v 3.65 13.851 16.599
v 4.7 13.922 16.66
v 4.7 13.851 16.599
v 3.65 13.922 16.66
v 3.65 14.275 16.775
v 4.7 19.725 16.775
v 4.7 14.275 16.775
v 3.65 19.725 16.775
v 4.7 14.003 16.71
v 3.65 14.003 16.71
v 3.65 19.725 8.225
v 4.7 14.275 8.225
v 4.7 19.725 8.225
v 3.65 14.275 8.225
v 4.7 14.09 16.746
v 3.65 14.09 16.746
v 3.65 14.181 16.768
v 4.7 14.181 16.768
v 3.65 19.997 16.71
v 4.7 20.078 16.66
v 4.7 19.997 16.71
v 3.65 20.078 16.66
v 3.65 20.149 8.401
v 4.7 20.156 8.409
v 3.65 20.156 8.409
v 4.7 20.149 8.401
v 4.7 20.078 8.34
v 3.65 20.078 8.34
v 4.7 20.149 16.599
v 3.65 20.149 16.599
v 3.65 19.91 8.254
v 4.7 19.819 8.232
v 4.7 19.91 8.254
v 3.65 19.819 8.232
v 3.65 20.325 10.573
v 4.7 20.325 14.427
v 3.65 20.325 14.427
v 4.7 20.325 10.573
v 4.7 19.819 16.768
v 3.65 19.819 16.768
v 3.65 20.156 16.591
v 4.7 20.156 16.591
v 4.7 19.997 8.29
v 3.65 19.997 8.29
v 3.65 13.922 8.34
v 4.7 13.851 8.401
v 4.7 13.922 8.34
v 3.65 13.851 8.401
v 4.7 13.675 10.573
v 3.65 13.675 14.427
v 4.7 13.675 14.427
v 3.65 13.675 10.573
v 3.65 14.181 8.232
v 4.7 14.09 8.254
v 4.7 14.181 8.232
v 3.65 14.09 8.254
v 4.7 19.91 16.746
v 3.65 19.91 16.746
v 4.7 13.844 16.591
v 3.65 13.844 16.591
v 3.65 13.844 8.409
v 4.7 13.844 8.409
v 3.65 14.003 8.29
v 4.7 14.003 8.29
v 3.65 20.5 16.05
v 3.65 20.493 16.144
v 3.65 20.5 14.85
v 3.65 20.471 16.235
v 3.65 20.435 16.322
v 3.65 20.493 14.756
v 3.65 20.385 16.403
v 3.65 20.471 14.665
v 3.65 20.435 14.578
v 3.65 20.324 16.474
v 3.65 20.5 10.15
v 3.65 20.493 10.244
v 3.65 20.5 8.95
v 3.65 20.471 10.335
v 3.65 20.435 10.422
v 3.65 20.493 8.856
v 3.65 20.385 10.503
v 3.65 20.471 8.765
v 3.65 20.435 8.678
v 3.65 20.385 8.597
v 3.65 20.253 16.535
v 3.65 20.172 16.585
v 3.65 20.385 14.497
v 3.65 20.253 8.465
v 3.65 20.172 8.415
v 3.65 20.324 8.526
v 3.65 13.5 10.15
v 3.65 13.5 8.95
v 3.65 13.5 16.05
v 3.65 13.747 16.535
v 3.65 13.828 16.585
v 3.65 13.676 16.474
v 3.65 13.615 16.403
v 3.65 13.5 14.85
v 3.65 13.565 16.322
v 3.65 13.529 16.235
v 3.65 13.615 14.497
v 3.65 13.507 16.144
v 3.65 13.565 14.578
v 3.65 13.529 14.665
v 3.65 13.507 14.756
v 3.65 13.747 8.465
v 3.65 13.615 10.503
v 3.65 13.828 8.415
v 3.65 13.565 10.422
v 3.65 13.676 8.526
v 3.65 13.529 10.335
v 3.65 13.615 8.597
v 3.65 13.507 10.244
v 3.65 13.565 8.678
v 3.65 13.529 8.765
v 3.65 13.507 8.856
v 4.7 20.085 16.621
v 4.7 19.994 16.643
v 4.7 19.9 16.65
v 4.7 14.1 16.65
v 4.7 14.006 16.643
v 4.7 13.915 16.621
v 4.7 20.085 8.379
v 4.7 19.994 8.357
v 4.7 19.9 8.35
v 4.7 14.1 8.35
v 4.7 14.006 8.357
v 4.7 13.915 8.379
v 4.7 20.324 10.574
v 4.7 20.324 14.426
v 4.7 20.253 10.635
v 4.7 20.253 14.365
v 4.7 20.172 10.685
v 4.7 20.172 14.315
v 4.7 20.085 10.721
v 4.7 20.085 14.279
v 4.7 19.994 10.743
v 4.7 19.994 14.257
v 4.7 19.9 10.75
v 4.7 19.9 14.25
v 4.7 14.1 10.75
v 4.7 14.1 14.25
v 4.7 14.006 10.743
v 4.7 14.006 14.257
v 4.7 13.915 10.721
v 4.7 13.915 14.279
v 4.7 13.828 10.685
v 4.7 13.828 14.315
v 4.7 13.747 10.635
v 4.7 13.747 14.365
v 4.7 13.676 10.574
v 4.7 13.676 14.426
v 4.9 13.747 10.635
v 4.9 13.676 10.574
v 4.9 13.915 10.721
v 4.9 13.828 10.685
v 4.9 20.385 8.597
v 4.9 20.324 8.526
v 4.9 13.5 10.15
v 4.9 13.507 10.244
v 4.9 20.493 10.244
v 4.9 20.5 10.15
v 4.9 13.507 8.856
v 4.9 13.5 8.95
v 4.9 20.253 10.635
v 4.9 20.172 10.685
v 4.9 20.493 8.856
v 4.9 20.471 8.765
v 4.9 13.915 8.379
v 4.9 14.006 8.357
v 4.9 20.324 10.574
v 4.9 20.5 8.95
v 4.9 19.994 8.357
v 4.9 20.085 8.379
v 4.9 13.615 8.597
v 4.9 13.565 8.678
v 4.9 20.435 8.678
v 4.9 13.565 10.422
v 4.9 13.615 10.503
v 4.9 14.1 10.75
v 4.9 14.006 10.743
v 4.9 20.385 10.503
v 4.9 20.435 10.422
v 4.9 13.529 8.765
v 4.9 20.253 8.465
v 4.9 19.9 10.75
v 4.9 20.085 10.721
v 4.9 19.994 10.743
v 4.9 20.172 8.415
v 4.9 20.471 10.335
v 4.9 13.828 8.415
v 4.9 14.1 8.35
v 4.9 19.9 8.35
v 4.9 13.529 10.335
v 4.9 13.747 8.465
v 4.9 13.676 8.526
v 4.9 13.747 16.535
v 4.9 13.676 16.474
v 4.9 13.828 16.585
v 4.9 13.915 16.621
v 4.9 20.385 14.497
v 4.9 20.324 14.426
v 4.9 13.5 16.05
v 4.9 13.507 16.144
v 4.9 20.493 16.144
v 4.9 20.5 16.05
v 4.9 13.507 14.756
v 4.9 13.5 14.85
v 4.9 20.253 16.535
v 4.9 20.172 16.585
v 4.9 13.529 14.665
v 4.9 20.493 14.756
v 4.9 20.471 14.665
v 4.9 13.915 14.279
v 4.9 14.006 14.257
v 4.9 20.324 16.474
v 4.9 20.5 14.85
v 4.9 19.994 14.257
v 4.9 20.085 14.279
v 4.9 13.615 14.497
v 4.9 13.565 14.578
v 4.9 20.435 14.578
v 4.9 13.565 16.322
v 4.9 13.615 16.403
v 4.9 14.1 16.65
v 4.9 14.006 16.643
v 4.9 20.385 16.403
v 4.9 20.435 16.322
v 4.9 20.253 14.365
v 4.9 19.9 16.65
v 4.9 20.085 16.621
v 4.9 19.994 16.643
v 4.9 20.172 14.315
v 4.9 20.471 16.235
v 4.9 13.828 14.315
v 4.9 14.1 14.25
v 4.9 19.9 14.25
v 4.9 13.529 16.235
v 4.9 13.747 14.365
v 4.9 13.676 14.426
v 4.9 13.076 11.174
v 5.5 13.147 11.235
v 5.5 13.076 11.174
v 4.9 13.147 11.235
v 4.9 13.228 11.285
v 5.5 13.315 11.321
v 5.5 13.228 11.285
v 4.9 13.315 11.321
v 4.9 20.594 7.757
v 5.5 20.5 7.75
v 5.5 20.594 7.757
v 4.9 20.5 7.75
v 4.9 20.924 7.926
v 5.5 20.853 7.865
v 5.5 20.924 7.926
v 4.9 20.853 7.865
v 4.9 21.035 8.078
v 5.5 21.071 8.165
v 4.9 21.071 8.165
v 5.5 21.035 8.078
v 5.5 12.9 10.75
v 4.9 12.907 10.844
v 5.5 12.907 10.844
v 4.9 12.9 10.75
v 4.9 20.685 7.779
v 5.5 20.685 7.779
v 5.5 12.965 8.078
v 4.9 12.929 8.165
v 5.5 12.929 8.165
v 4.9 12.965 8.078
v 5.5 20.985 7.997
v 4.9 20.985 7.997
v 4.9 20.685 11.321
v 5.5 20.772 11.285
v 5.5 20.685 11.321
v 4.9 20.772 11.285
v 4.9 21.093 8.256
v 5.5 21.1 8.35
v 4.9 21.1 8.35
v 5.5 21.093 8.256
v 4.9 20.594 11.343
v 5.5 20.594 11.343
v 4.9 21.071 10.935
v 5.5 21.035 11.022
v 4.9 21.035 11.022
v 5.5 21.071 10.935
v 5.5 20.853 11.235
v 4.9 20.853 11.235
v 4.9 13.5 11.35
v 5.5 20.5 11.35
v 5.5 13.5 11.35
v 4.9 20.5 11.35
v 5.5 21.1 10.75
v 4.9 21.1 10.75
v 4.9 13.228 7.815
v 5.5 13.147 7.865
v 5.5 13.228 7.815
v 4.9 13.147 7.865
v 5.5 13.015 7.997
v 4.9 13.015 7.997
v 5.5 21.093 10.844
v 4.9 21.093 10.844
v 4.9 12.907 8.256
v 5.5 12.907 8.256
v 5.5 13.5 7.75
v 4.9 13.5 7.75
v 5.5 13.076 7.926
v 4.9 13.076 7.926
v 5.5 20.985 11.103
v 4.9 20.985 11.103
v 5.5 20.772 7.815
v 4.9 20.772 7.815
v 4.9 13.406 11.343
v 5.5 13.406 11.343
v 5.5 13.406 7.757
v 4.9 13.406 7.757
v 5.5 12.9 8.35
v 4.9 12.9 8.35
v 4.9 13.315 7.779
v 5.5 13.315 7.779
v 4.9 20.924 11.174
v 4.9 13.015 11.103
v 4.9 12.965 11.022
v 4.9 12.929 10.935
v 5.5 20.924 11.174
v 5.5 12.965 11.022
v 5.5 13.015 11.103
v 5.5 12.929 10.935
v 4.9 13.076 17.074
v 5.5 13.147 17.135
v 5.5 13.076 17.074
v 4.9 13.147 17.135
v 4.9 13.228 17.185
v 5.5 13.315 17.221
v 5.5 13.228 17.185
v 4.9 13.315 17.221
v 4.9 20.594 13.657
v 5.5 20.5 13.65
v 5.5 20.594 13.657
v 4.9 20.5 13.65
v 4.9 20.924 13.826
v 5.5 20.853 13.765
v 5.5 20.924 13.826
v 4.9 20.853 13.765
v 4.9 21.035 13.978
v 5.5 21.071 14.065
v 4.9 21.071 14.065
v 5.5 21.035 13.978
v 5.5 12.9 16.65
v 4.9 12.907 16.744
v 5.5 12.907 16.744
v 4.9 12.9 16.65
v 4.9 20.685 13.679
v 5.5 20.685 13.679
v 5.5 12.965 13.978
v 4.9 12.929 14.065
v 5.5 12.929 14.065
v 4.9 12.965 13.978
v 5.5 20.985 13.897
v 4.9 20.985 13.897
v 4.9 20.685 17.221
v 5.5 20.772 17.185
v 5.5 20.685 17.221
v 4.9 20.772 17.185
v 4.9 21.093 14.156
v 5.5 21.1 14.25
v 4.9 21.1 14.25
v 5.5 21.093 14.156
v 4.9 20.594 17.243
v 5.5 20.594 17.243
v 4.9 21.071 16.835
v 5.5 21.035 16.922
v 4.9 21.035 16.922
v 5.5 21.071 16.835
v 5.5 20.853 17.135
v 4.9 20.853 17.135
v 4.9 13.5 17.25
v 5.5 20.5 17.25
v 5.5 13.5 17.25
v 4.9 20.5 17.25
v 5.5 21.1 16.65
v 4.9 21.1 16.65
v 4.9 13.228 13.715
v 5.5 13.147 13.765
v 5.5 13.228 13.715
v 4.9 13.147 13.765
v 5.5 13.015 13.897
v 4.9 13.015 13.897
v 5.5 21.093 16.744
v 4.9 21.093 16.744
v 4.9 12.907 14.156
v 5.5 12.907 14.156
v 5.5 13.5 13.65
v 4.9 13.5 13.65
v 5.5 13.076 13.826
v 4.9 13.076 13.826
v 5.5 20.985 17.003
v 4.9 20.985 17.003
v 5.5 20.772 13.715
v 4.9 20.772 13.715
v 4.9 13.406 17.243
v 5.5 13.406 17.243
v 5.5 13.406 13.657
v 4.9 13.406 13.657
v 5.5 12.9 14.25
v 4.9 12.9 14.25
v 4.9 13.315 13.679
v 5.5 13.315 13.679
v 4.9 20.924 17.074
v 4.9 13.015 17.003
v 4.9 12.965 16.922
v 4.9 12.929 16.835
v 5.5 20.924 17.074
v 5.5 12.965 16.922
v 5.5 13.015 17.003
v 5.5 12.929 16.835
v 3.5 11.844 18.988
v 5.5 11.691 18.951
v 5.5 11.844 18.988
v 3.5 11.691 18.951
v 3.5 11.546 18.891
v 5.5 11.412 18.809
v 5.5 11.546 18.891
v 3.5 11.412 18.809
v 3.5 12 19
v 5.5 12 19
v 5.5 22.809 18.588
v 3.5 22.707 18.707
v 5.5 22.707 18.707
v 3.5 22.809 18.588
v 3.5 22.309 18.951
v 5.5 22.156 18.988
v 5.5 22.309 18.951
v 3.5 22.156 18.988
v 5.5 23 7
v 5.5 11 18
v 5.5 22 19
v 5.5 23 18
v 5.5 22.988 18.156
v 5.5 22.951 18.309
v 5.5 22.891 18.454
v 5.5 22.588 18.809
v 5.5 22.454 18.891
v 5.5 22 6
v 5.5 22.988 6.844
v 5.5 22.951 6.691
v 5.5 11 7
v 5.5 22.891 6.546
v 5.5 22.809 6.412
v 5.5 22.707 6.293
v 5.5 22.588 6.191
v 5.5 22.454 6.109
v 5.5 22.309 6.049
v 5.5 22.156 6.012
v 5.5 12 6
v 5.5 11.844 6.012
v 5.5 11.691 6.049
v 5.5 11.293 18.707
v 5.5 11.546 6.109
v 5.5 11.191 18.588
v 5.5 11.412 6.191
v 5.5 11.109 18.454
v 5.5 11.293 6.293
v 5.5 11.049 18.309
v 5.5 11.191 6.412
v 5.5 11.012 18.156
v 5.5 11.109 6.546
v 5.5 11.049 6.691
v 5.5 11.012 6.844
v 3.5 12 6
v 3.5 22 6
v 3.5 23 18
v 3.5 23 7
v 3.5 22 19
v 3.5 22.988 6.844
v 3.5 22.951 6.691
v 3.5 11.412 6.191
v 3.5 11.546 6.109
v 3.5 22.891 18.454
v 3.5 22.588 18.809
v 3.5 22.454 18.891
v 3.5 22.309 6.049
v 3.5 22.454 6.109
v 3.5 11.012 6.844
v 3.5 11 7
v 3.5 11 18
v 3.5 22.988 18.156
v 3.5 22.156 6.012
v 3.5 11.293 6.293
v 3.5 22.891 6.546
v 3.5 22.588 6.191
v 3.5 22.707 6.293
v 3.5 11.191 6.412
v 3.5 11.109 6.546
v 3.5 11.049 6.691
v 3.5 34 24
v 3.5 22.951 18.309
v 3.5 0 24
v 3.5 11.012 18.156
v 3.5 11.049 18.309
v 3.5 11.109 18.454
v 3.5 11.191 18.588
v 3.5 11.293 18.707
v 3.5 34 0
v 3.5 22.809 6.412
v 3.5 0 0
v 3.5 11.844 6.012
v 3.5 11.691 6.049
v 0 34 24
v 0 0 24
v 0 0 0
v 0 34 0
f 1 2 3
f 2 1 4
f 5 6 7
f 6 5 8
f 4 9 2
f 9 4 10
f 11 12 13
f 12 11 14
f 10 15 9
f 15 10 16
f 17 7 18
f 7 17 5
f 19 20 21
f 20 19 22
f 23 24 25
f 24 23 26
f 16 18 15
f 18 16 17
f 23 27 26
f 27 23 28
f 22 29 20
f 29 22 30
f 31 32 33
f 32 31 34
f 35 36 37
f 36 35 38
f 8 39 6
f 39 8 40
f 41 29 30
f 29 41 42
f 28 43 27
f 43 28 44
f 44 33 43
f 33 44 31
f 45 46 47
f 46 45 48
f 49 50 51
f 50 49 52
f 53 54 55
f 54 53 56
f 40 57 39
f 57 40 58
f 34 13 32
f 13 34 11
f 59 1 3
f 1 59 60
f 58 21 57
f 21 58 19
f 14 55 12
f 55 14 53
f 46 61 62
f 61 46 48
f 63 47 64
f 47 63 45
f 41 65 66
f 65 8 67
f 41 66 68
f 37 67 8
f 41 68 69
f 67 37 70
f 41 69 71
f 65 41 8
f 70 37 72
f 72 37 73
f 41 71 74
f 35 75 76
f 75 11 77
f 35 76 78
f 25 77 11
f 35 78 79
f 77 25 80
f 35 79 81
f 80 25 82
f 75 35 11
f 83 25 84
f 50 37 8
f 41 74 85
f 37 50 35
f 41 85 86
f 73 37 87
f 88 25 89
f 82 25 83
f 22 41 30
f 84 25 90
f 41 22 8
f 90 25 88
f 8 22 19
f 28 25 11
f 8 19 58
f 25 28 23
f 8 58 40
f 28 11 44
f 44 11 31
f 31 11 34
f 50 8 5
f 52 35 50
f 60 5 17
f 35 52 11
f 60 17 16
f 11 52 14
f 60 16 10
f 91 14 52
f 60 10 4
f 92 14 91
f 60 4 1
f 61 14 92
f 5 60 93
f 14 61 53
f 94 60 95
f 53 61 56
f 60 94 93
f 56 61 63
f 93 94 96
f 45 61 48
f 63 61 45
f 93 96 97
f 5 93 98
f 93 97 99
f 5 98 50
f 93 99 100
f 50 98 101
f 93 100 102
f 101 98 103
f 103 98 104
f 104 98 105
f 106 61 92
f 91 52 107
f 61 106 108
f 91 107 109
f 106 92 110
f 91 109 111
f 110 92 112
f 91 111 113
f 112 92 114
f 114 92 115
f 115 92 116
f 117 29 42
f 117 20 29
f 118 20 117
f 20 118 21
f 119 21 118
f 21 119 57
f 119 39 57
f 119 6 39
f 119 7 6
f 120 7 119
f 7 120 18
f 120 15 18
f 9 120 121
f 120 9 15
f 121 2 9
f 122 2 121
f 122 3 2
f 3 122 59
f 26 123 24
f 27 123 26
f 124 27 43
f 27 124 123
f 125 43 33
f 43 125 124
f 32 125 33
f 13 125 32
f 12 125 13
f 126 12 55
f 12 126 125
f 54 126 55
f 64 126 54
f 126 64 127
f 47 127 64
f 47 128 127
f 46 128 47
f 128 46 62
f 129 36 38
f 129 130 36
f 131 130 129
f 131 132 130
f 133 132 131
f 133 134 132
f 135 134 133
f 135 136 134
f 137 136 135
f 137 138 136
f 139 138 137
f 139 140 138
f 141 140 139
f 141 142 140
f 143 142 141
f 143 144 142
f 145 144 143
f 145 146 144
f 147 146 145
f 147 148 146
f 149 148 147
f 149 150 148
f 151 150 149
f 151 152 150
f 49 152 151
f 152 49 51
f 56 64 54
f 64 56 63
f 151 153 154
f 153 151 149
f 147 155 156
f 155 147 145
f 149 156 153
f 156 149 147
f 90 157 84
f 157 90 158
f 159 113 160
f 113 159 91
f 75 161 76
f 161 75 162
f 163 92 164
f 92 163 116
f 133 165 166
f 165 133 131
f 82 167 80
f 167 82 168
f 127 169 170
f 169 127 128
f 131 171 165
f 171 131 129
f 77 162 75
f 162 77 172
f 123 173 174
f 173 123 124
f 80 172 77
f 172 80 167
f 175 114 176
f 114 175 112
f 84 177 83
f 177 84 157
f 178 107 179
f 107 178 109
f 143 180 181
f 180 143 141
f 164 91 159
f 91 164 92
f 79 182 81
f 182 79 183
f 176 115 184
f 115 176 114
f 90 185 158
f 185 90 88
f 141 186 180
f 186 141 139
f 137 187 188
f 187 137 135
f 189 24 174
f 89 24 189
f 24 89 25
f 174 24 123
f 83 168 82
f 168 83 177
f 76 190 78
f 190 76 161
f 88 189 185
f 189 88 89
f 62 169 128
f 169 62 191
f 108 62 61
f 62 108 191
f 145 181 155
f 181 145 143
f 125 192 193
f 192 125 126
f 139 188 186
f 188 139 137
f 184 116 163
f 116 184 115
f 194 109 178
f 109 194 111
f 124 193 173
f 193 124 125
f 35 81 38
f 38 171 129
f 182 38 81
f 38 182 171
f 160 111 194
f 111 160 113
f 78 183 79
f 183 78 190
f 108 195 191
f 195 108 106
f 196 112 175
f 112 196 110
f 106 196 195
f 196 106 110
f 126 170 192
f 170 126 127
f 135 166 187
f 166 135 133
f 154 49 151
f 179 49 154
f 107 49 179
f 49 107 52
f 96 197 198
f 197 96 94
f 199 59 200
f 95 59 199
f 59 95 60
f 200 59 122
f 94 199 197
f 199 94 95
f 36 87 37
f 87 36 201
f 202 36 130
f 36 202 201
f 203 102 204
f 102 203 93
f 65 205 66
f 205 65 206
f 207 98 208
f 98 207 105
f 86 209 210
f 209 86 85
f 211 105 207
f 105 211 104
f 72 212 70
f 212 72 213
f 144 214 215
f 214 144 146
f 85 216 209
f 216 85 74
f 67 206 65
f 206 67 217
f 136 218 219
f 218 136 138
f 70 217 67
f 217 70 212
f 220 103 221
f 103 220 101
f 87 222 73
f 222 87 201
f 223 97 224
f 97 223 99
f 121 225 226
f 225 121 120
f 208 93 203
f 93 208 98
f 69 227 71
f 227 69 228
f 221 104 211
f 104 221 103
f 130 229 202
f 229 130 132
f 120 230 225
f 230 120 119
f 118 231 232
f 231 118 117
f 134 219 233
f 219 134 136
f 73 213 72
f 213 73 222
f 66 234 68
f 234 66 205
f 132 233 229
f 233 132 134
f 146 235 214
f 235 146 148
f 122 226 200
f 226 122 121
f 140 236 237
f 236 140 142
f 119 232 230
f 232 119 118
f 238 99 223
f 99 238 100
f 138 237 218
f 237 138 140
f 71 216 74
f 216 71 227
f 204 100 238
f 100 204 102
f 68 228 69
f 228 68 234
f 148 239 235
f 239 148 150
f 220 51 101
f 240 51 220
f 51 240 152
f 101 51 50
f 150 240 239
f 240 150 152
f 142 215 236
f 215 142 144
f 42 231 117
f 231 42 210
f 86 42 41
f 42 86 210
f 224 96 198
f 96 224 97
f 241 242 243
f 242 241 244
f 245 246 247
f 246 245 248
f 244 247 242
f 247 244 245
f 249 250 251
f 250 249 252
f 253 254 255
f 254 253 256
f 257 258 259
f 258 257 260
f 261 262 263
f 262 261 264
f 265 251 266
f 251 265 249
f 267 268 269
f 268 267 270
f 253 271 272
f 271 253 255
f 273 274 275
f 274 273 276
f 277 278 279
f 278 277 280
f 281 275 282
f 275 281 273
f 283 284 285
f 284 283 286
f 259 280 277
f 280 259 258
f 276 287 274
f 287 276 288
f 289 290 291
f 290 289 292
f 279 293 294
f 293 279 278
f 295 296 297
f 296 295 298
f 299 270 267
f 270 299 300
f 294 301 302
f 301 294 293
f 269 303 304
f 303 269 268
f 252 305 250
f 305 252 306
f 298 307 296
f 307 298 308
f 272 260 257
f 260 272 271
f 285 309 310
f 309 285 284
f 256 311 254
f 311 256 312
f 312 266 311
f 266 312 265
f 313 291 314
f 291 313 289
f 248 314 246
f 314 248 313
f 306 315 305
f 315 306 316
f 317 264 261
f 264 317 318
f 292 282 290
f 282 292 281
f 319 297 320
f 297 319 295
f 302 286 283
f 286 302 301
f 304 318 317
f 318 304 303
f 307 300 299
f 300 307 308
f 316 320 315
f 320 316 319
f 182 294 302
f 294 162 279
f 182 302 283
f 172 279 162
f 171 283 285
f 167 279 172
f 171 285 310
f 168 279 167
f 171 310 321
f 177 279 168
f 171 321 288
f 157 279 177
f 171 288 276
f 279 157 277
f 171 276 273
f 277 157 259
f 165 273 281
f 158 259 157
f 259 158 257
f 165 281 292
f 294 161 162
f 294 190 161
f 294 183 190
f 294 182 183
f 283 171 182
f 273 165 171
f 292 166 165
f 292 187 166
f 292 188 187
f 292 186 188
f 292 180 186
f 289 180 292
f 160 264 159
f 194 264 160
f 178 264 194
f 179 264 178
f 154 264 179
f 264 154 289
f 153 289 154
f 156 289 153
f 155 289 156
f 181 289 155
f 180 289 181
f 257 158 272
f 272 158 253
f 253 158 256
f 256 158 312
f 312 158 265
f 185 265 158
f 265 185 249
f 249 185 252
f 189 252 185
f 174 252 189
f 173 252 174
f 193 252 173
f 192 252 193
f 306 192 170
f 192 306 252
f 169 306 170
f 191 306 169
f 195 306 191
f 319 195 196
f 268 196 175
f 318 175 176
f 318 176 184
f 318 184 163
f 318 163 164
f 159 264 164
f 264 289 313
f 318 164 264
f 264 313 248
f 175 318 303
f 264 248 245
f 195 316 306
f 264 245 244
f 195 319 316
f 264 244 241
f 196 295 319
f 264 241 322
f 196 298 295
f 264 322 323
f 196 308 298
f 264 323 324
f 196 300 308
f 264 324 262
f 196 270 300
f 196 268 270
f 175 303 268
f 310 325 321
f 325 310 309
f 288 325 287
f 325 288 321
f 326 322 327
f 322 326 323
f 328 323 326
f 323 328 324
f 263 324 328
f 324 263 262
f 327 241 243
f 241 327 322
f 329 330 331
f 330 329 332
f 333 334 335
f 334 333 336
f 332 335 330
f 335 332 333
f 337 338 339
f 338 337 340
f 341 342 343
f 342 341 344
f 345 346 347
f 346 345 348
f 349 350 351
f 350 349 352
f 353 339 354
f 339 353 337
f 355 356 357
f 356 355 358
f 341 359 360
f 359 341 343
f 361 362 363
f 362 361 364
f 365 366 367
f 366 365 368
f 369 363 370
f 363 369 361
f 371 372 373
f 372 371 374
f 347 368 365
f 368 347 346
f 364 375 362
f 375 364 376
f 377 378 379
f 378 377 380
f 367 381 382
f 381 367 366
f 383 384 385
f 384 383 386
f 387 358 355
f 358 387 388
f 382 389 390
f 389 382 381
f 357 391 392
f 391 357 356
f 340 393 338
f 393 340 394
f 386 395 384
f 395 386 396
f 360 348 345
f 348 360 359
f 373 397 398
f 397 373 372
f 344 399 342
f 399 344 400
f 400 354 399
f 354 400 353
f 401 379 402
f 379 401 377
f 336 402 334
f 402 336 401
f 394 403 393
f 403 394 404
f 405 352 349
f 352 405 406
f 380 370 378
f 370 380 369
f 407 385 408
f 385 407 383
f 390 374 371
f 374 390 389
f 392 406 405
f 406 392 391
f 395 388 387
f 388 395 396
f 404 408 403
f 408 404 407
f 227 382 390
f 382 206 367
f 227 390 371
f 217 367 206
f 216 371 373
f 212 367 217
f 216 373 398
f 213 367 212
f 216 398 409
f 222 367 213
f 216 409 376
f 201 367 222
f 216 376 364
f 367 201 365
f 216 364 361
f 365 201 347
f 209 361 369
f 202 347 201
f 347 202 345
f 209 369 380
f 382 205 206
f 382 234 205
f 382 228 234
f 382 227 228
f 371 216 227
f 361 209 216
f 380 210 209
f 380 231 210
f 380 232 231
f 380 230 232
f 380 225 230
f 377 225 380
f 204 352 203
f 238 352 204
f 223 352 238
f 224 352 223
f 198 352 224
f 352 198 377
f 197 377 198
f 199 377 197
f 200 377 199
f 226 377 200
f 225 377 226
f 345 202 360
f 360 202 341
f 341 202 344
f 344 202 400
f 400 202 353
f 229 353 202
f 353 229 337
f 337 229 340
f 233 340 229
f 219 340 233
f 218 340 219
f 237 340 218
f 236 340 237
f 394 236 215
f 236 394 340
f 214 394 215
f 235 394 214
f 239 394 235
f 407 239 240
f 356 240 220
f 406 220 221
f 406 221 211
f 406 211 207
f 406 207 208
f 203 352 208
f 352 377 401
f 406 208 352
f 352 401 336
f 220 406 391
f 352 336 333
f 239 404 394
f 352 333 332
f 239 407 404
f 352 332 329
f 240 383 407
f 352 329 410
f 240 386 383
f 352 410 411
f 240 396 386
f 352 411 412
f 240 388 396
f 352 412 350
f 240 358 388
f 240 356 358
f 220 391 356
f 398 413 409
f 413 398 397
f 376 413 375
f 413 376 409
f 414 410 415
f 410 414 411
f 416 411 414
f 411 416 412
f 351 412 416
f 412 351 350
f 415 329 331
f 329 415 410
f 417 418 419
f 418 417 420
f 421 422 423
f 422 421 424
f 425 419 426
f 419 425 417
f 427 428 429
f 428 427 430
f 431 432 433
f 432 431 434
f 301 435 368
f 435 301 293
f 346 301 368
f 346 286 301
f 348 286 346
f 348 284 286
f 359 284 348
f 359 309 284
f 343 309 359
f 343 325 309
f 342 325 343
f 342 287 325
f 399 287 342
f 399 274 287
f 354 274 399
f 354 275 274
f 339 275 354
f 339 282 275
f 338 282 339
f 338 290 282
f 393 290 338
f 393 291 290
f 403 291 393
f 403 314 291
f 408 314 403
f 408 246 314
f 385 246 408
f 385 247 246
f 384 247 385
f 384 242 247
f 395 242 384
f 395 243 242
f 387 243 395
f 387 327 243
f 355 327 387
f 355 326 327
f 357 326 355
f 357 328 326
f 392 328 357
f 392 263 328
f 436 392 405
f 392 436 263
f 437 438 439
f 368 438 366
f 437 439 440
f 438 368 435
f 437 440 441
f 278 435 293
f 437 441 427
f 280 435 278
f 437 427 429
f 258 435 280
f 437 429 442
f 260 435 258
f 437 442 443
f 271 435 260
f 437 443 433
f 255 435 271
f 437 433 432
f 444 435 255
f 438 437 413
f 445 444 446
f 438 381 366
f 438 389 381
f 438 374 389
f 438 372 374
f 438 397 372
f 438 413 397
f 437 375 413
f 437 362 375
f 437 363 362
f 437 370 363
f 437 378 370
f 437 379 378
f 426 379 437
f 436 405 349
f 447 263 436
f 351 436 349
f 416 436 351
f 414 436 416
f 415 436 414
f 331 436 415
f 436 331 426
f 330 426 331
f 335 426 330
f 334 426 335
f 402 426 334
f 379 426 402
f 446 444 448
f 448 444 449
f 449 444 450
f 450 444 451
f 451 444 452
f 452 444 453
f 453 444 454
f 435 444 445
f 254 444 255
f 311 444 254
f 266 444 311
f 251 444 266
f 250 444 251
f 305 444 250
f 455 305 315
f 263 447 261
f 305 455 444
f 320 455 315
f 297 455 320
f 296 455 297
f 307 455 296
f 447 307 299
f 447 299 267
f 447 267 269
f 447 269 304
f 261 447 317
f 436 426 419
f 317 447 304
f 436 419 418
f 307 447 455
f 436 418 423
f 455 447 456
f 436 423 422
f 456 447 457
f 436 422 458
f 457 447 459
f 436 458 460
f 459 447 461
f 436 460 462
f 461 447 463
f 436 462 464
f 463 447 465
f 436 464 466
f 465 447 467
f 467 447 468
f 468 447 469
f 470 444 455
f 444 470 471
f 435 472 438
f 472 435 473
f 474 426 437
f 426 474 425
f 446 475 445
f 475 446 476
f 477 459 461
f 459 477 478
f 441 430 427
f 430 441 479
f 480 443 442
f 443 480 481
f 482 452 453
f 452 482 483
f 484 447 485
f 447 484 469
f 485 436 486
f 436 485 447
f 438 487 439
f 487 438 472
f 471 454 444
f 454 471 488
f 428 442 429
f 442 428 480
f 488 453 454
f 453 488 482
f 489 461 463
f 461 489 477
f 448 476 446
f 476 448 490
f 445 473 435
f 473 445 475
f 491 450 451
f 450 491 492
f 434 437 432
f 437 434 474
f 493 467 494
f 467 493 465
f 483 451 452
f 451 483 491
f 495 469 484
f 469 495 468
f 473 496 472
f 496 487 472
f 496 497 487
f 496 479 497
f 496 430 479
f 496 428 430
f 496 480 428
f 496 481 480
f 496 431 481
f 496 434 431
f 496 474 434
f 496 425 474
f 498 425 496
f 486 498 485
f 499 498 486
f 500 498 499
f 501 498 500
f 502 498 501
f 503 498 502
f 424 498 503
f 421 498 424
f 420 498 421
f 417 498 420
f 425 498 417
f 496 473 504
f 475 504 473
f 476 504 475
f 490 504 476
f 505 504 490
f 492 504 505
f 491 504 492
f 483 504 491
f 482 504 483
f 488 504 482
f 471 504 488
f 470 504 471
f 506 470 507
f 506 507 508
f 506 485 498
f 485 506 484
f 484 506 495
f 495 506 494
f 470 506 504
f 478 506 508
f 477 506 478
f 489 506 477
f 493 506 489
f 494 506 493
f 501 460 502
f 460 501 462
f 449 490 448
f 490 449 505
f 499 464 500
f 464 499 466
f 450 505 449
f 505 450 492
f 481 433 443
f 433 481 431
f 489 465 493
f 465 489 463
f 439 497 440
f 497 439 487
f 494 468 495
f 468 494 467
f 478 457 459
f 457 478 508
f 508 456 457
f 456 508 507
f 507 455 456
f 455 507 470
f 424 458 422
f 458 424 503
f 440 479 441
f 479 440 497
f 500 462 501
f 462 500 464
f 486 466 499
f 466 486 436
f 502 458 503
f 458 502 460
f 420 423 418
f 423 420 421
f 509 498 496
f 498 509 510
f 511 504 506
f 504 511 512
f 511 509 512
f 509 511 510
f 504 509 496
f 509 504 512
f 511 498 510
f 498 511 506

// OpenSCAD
// Wall-integrated recessed zip-tie bridge pattern.
// The exterior wall remains solid. Slot cuts are limited to the inward pad.

$fn = 40;
eps = 0.02;

wall_thickness = 3.5;
wall_length = 34;
wall_height = 24;

pad_width = 12;
pad_height = 13;
pad_projection = 2.0;
pad_z = 6;
pad_y = wall_length / 2;

slot_width = 7.0;
slot_height = 2.4;
vertical_gap = 3.5;
slot_chamfer = 0.6;
center_bridge_rounding = 0.8;
edge_radius = 1.0;

show_zip_tie_path_preview = true;

function slot_stack_height() = 2 * slot_height + vertical_gap;
function slot_z0() = (pad_height - slot_stack_height()) / 2;
function back_skin() = 0.15;
function front_skin() = min(max(0.55, center_bridge_rounding), pad_projection - 0.35);
function slot_cut_depth() = pad_projection - back_skin();

module rounded_box_2d(w, h, r) {
    rr = max(0.01, min(r, min(w, h) / 2 - 0.01));
    hull()
        for (x = [rr, w - rr])
            for (y = [rr, h - rr])
                translate([x, y])
                    circle(r = rr);
}

module centered_rounded_rect_2d(w, h, r) {
    translate([-w / 2, -h / 2])
        rounded_box_2d(w, h, r);
}

module rounded_yz_cut(depth, width_y, height_z, radius, x0, zc) {
    translate([x0, 0, zc])
        rotate([0, 90, 0])
            linear_extrude(height = depth)
                centered_rounded_rect_2d(height_z, width_y, radius);
}

module wall_segment() {
    color([0.72, 0.72, 0.68])
        cube([wall_thickness, wall_length, wall_height]);
}

module pad_body() {
    translate([0, 0, pad_height / 2])
        rotate([0, 90, 0])
            linear_extrude(height = pad_projection)
                centered_rounded_rect_2d(pad_height, pad_width, edge_radius);
}

module bridge_cutouts() {
    lower_z = slot_z0() + slot_height / 2;
    upper_z = lower_z + slot_height + vertical_gap;
    stack_z = slot_z0() + slot_stack_height() / 2;
    slot_x = pad_projection - slot_cut_depth();
    face_depth = min(slot_chamfer, slot_cut_depth() / 2);

    // Behind-bridge channel stops before the inside face, leaving the center bridge.
    rounded_yz_cut(
        pad_projection - front_skin() - back_skin(),
        slot_width - 0.35,
        slot_stack_height() + 0.25,
        slot_chamfer,
        back_skin(),
        stack_z
    );

    // Lower and upper inside-facing slots.
    rounded_yz_cut(slot_cut_depth() + eps, slot_width, slot_height, slot_chamfer, slot_x, lower_z);
    rounded_yz_cut(slot_cut_depth() + eps, slot_width, slot_height, slot_chamfer, slot_x, upper_z);

    // Shallow larger mouth cuts soften the exposed edges.
    rounded_yz_cut(face_depth + eps, slot_width + 2 * slot_chamfer, slot_height + 2 * slot_chamfer, slot_chamfer, pad_projection - face_depth, lower_z);
    rounded_yz_cut(face_depth + eps, slot_width + 2 * slot_chamfer, slot_height + 2 * slot_chamfer, slot_chamfer, pad_projection - face_depth, upper_z);
}

module wall_integrated_zip_tie_bridge() {
    wall_segment();

    translate([wall_thickness, pad_y, pad_z])
        difference() {
            pad_body();
            bridge_cutouts();
        }
}

module zip_tie_path_preview() {
    if (show_zip_tie_path_preview) {
        lower_z = pad_z + slot_z0() + (slot_height - 1.4) / 2;
        upper_z = lower_z + slot_height + vertical_gap;

        %color([0.05, 0.35, 1.0, 0.35]) {
            translate([wall_thickness + pad_projection / 2, pad_y, lower_z])
                cube([pad_projection + 0.5, 4.0, 1.4], center = true);
            translate([wall_thickness + pad_projection / 2, pad_y, upper_z])
                cube([pad_projection + 0.5, 4.0, 1.4], center = true);
        }
    }
}

wall_integrated_zip_tie_bridge();
zip_tie_path_preview();
